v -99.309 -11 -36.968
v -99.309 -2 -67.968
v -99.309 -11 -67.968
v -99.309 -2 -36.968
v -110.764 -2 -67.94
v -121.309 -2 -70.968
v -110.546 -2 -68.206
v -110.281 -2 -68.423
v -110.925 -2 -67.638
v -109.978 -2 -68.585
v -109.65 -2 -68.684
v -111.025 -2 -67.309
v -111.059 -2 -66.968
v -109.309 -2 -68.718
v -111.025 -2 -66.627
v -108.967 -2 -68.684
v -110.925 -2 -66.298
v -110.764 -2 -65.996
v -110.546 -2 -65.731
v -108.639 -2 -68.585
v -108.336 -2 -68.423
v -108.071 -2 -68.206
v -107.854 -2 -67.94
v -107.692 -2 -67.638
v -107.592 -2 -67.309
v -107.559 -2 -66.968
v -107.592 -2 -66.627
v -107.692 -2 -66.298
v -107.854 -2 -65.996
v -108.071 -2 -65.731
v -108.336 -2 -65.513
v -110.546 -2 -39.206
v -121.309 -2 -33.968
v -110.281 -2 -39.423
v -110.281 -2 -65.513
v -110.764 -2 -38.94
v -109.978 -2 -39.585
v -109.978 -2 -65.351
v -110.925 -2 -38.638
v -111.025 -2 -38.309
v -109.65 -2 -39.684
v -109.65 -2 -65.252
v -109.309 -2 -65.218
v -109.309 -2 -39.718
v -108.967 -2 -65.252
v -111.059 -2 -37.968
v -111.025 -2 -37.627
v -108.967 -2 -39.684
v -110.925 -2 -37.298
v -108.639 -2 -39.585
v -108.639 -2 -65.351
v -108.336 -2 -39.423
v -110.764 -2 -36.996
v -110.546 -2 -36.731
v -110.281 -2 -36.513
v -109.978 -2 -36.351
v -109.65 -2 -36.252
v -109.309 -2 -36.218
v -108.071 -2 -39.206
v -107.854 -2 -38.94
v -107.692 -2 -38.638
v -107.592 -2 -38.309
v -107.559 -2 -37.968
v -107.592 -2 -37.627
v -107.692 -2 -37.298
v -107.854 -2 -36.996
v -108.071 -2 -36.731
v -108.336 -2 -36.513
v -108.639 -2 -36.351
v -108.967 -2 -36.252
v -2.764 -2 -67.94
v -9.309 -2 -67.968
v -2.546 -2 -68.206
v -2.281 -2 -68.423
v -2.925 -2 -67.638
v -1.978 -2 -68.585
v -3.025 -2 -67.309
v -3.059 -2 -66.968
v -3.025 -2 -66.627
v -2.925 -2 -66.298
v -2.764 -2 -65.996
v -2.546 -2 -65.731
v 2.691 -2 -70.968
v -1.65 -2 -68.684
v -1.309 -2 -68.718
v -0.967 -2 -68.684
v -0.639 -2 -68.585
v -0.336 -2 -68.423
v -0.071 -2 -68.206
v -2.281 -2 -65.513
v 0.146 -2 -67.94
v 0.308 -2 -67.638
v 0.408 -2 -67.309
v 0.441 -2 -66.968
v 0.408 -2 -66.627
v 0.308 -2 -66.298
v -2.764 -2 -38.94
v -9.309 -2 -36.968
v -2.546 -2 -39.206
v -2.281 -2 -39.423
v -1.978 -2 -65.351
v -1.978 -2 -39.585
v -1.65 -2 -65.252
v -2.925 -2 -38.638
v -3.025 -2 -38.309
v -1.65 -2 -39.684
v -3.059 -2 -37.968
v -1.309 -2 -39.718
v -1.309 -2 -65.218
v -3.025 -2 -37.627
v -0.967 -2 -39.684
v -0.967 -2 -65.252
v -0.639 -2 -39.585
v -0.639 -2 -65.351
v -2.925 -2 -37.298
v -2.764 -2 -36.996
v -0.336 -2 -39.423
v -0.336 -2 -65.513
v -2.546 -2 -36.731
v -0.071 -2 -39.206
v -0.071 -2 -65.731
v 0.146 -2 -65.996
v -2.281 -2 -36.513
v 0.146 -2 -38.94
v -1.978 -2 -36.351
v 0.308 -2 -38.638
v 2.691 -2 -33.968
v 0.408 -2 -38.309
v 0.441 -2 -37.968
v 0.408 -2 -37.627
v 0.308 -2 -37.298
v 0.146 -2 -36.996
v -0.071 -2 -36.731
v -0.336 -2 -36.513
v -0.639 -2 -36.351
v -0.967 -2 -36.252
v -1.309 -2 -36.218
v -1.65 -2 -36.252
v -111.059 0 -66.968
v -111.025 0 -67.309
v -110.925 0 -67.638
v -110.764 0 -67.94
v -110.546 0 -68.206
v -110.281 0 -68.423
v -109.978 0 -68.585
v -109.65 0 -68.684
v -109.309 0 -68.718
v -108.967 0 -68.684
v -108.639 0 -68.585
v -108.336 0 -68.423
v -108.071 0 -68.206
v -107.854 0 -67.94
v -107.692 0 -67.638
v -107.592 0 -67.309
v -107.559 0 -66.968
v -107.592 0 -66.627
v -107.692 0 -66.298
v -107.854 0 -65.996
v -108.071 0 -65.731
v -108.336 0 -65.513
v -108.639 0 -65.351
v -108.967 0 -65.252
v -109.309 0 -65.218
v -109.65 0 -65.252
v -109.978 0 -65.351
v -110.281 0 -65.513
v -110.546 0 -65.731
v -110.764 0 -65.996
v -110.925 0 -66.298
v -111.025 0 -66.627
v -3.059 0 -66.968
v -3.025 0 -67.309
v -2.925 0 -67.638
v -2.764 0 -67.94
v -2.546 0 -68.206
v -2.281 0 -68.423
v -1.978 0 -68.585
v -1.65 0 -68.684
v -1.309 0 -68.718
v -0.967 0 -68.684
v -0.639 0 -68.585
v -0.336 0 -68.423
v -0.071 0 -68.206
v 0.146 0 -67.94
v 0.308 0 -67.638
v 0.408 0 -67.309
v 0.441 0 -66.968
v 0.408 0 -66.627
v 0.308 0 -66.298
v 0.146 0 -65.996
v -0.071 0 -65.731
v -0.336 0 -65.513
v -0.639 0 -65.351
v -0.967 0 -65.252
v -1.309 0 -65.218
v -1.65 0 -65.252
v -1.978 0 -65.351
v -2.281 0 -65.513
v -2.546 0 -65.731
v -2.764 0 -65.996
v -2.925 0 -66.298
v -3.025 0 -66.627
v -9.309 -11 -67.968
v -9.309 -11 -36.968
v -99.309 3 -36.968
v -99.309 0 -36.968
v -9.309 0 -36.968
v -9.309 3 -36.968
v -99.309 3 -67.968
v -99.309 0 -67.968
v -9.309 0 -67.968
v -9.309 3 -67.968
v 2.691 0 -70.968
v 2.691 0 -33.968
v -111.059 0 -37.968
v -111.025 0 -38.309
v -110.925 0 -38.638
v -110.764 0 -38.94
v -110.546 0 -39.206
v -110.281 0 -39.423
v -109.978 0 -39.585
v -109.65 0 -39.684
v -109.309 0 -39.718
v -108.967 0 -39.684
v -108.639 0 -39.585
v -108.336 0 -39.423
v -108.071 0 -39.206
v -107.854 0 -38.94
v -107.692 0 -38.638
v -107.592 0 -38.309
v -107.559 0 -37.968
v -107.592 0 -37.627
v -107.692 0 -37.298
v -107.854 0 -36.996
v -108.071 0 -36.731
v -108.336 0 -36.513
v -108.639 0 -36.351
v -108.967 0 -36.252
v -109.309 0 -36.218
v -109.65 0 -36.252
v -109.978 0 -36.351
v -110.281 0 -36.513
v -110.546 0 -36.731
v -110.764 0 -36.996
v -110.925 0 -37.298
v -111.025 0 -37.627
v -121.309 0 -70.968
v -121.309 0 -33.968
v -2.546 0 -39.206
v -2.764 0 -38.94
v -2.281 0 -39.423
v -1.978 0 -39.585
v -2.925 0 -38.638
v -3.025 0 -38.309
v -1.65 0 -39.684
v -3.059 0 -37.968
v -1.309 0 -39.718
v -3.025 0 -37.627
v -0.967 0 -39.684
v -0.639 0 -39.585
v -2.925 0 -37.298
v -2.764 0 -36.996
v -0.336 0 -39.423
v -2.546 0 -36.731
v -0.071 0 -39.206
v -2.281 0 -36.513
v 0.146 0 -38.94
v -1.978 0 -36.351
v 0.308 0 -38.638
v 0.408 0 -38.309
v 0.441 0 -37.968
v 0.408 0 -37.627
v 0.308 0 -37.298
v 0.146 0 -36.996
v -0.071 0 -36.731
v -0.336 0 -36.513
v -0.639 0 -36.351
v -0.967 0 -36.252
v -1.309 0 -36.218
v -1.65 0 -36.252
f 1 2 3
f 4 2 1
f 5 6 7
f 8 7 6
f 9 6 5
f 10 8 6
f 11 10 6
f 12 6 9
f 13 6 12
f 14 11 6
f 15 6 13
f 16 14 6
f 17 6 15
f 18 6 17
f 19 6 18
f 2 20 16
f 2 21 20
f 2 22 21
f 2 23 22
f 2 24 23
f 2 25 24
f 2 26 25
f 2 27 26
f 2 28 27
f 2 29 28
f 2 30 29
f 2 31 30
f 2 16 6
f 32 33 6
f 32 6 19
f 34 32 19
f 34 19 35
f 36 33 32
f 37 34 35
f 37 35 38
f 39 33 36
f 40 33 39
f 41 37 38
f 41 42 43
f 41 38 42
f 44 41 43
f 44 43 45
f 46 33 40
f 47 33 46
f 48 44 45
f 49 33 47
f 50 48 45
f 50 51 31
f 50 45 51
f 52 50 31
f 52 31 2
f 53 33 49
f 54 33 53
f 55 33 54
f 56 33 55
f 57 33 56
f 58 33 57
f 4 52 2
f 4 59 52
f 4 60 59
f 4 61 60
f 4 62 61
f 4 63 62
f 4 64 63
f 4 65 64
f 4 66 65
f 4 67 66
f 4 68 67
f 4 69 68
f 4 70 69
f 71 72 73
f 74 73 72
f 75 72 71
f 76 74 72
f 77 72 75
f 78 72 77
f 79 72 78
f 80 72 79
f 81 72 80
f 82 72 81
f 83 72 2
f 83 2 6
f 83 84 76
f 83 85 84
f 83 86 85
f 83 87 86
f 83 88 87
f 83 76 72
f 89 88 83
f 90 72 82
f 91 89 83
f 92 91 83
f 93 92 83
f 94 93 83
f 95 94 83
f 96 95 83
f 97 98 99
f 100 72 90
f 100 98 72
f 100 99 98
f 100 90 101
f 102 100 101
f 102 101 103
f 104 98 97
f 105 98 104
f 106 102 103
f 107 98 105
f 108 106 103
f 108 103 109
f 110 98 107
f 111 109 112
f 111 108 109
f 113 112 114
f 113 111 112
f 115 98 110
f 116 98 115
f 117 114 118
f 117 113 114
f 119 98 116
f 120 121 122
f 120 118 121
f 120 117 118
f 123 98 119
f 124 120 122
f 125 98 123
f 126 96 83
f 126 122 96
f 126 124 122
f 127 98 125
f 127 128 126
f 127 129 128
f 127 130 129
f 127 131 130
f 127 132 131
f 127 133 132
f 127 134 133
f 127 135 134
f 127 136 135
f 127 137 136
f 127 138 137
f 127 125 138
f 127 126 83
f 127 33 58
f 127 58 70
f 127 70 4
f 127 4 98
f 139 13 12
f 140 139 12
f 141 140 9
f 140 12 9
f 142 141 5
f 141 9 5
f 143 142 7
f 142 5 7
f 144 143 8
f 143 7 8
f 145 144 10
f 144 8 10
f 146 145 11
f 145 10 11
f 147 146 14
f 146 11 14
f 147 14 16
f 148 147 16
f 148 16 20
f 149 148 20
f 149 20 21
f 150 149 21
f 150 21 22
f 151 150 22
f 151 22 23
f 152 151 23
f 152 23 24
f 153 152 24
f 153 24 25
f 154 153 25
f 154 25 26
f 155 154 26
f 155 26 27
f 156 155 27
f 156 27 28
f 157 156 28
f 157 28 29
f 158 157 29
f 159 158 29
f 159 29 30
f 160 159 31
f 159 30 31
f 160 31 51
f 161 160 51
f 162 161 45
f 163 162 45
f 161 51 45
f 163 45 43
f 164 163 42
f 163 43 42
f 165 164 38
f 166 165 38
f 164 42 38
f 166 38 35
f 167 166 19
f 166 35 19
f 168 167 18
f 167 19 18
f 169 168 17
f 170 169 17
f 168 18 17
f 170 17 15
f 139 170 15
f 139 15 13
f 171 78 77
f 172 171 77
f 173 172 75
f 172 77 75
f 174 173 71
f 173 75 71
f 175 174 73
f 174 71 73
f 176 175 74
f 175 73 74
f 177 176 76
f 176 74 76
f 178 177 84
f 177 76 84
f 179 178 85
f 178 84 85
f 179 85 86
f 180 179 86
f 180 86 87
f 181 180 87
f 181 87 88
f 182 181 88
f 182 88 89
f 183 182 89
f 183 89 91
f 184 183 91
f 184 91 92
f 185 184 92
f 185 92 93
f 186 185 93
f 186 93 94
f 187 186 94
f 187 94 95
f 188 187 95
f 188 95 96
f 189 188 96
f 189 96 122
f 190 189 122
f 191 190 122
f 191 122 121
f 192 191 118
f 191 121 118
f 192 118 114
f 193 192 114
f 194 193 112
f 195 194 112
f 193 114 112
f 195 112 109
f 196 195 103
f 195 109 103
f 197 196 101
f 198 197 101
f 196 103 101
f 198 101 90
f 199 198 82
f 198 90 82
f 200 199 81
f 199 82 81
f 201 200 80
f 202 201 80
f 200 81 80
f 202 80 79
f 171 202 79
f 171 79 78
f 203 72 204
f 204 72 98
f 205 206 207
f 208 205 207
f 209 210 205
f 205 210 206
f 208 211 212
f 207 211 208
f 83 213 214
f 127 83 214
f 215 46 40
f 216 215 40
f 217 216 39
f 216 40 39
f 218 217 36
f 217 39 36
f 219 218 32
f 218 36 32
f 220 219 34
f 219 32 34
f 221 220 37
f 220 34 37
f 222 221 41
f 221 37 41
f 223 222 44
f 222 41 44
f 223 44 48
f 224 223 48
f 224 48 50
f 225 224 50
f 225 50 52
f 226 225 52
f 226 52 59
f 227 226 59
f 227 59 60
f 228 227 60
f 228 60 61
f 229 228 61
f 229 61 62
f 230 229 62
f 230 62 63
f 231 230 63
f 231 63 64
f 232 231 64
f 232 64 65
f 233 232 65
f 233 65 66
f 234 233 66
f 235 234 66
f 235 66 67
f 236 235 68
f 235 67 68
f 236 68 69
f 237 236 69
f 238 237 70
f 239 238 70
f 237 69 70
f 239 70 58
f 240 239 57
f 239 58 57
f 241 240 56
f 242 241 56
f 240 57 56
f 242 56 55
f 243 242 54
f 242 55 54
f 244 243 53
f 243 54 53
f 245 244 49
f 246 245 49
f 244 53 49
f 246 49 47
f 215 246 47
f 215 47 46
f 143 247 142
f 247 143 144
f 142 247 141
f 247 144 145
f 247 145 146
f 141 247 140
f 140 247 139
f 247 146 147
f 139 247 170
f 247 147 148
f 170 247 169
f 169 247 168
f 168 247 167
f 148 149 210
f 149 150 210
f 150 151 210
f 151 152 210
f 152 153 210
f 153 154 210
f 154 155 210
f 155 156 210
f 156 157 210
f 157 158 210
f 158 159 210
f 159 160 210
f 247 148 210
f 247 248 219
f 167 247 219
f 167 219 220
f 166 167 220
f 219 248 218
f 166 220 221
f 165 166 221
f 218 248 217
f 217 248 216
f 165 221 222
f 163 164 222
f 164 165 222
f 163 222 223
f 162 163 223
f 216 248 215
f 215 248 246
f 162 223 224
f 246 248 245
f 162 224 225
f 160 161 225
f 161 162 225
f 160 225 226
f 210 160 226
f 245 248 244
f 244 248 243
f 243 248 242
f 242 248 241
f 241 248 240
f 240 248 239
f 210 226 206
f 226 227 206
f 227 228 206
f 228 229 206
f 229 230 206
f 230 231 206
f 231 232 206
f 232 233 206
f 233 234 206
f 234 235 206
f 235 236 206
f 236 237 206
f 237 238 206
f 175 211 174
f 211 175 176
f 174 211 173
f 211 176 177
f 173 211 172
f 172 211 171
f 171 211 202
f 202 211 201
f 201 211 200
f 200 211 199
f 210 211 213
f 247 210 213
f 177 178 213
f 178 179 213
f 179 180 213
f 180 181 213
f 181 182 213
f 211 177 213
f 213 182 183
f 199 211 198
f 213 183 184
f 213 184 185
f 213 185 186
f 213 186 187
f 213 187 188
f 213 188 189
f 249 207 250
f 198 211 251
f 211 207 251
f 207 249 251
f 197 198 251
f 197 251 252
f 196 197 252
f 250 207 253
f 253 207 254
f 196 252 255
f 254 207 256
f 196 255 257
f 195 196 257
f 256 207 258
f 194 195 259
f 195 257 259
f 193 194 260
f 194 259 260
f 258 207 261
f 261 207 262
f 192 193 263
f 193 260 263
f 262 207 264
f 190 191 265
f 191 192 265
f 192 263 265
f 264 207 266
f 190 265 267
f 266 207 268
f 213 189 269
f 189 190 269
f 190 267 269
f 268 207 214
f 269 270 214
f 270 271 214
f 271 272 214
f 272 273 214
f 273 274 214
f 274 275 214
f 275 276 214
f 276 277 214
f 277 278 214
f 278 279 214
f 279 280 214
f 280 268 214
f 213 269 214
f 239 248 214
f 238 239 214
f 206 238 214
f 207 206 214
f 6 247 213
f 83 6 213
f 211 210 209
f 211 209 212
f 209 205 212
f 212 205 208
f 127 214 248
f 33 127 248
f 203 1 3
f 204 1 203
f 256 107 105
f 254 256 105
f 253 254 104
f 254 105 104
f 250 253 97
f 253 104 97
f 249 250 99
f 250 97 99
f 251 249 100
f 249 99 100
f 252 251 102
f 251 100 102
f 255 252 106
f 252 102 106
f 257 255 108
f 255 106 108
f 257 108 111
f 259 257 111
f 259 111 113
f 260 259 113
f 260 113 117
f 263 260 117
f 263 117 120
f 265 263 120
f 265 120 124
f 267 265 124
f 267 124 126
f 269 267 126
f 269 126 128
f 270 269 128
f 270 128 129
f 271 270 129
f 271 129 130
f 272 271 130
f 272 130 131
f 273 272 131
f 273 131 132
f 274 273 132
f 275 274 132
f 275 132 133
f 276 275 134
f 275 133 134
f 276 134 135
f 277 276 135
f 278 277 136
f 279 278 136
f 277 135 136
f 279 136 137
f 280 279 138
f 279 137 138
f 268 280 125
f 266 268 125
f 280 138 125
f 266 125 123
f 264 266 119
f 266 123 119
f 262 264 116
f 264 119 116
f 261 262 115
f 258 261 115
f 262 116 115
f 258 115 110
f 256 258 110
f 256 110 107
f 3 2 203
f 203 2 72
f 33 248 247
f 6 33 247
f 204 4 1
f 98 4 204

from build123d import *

# Parameters (mm, degrees)
F0_W     = 12
F0_H     = 29
F0_H_2   = 4
F0_W_2   = 90
F0_H_3   = 31
F0_W_3   = 4
F1_DEPTH = 2
F2_DEPTH = 11
F3_D     = 3.5
F4_DEPTH = 3


with BuildPart() as f1:
    # F0 (on Front) → F1 (new body)
    with BuildSketch(Plane.XZ):
        with Locations((-115.3087058514, -52.4680708938)):
            Rectangle(F0_W, F0_H)
        with Locations((-115.3087058514, -35.9680708938)):
            Rectangle(F0_W, F0_H_2)
        Polygon((-109.3087058514, -66.9680708938), (-109.3087058514, -70.9680708938), (-1.3087058514, -70.9680708938), (-1.3087058514, -66.9680708938), (-1.3087058514, -37.9680708938), (-1.3087058514, -33.9680708938), (-109.3087058514, -33.9680708938), (-109.3087058514, -37.9680708938), align=None)
        with Locations((-54.3087058514, -52.4680708938)):
            Rectangle(F0_W_2, F0_H_3, mode=Mode.SUBTRACT)
        with Locations((-115.3087058514, -68.9680708938)):
            Rectangle(F0_W, F0_H_2)
        with Locations((0.6912941486, -35.9680708938)):
            Rectangle(F0_W_3, F0_H_2)
        with Locations((0.6912941486, -52.4680708938)):
            Rectangle(F0_W_3, F0_H)
        with Locations((0.6912941486, -68.9680708938)):
            Rectangle(F0_W_3, F0_H_2)
    extrude(amount=F1_DEPTH)

    # F0 (on Front) → F2 (join)
    with BuildSketch(Plane.XZ):
        with Locations((-54.3087058514, -52.4680708938)):
            Rectangle(F0_W_2, F0_H_3)
    extrude(amount=F2_DEPTH)

    # F3 (through all)
    with Locations(Plane(origin=(0, 0, 0), x_dir=(1, 0, 0), z_dir=(0, 1, 0))):
        with Locations((-109.3087058514, 37.9680708938), (-109.3087058514, 66.9680708938), (-1.3087058514, 37.9680708938), (-1.3087058514, 66.9680708938)):
            Hole(F3_D / 2)

    # F0 (on Front) → F4 (join)
    with BuildSketch(Plane.XZ):
        with Locations((-54.3087058514, -52.4680708938)):
            Rectangle(F0_W_2, F0_H_3)
    extrude(amount=-F4_DEPTH)


solid = f1.part
